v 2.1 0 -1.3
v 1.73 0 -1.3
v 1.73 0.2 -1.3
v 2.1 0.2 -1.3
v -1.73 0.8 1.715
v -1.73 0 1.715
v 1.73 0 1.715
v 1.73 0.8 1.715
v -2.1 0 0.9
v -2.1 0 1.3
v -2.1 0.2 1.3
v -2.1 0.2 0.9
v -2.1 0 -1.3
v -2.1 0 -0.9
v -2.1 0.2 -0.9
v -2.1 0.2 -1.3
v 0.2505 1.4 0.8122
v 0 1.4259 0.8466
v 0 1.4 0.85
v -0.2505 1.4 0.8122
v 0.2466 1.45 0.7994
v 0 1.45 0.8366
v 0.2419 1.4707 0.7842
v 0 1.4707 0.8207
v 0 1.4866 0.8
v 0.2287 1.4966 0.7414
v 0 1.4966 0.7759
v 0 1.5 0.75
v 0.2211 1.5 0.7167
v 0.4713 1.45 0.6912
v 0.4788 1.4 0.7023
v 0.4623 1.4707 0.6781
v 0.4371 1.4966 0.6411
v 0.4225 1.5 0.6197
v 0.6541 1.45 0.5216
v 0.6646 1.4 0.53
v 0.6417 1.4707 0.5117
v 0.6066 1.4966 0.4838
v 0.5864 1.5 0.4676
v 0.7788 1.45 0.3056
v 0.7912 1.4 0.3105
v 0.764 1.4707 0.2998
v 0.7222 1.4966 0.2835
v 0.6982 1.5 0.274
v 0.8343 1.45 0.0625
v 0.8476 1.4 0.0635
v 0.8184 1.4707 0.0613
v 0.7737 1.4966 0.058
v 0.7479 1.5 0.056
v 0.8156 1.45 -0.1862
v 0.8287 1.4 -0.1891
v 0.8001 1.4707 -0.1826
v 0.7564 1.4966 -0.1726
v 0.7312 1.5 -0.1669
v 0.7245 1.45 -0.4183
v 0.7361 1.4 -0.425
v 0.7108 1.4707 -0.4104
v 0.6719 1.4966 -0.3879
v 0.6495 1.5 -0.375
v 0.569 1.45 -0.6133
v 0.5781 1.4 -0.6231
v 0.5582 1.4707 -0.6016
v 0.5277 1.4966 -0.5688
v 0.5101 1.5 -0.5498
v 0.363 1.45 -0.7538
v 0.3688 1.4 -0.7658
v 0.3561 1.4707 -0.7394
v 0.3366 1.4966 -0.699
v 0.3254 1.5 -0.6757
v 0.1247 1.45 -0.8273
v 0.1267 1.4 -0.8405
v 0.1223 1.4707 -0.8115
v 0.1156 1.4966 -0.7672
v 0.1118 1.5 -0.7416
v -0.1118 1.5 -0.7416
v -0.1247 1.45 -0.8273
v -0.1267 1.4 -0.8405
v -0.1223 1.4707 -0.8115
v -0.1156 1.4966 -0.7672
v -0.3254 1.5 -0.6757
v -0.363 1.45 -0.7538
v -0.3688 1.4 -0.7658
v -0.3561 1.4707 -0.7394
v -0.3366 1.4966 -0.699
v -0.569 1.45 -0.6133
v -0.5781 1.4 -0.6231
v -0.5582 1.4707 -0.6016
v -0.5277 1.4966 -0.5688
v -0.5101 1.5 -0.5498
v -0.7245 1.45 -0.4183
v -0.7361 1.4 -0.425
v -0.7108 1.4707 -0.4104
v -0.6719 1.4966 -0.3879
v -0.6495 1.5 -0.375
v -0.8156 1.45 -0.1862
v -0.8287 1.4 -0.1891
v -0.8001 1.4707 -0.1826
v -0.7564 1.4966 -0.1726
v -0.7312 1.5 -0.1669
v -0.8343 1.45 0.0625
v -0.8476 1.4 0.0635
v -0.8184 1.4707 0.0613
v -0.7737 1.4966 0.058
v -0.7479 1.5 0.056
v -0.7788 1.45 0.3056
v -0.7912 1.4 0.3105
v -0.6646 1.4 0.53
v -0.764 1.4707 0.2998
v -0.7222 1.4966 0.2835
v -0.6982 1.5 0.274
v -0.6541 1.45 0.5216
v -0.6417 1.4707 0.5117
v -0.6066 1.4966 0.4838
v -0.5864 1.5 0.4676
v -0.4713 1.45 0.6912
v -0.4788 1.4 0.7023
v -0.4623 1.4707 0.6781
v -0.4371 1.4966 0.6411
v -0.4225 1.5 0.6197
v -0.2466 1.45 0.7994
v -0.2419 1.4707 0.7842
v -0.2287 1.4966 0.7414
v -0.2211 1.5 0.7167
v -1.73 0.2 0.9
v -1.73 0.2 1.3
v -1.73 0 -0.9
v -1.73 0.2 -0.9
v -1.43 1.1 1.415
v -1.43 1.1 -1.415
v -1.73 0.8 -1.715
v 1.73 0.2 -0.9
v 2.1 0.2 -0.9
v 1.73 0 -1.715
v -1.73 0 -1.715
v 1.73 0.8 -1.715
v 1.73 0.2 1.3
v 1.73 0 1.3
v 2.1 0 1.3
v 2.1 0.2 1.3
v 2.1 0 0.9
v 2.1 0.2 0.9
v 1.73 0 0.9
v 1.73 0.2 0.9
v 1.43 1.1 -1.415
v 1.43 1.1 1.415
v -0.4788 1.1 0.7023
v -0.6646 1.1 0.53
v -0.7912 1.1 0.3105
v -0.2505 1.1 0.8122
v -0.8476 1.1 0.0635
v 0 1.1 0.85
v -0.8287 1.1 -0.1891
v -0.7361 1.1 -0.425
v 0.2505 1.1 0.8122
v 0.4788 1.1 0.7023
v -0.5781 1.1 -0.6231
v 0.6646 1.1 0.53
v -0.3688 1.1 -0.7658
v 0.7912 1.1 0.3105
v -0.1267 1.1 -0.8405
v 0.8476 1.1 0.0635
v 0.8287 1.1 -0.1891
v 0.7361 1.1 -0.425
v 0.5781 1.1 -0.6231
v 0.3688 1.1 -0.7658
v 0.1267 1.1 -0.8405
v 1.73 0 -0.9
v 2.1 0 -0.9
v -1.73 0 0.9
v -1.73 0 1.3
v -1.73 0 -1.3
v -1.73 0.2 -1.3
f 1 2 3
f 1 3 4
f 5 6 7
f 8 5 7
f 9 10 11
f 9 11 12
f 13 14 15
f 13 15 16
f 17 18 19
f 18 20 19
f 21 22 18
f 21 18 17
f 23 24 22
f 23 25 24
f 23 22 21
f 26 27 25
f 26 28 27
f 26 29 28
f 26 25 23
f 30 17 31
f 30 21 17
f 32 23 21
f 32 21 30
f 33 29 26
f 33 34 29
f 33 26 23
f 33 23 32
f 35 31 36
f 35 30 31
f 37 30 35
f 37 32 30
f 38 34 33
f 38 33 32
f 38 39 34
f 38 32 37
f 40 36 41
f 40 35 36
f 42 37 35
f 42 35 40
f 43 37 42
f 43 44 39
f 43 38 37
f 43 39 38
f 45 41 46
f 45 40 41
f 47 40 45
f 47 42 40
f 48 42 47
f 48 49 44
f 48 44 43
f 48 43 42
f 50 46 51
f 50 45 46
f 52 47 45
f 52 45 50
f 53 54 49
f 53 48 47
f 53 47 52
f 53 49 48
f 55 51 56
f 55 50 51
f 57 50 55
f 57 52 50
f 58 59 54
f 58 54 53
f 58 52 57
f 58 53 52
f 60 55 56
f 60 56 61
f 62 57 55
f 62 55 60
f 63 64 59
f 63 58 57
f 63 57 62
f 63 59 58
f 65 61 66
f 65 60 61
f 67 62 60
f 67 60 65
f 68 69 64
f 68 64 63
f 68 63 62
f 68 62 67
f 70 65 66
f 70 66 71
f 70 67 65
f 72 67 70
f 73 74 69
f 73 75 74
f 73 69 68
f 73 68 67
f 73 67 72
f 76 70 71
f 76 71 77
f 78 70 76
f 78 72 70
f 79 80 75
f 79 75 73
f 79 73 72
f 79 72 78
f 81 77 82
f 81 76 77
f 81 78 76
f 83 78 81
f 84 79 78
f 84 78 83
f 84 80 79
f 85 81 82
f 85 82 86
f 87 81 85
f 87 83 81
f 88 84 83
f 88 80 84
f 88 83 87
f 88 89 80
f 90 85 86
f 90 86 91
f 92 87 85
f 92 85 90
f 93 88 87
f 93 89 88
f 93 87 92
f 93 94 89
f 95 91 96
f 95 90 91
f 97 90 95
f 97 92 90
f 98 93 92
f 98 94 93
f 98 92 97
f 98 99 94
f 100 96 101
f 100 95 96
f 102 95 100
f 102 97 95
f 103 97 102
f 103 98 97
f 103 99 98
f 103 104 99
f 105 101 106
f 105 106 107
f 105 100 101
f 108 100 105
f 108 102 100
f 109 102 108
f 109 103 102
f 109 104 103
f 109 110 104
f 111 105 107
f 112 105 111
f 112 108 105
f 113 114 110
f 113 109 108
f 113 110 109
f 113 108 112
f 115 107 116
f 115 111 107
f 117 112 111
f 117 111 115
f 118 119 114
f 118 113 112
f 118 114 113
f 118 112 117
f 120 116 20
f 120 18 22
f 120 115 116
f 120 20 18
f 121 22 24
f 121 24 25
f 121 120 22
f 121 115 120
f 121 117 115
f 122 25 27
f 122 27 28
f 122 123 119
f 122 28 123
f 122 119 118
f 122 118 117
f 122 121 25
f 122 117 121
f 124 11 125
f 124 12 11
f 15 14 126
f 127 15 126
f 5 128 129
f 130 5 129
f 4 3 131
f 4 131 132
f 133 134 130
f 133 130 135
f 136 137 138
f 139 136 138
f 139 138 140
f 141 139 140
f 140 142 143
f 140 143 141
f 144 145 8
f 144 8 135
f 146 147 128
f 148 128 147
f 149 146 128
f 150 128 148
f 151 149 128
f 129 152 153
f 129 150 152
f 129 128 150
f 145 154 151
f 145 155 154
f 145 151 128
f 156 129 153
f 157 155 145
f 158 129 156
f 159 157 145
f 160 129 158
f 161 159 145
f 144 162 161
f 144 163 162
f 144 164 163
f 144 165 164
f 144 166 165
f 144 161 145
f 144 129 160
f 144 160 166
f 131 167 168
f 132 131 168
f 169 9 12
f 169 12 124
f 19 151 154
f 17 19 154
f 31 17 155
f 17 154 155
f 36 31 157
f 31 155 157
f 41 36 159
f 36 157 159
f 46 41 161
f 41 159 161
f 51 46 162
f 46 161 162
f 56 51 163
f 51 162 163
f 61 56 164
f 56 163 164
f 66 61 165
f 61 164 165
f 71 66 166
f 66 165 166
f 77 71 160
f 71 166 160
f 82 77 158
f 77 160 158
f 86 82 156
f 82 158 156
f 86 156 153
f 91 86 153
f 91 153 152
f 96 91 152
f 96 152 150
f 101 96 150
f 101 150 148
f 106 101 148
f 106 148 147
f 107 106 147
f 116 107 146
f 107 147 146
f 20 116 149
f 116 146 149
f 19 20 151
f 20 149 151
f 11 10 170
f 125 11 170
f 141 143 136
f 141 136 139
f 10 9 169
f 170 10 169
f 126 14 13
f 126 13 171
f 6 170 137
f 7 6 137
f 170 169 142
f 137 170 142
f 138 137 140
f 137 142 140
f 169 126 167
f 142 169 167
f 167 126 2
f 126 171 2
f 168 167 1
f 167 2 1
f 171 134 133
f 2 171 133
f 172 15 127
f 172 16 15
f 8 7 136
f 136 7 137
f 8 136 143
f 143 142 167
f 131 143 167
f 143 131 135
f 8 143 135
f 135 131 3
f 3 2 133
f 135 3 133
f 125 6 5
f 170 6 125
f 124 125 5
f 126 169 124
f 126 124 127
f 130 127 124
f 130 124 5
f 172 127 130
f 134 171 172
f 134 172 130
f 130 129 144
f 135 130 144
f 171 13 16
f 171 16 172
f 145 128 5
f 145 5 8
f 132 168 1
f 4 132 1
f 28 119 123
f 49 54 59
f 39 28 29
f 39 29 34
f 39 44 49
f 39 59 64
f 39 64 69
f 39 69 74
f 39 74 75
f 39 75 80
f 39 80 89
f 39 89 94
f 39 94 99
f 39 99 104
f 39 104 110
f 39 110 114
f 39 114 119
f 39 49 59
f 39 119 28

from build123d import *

# Parameters (mm, degrees)
SKETCH1_W           = 3.46
SKETCH1_H           = 3.43
SKETCH1_W_2         = 0.37
SKETCH1_H_2         = 0.4
BOSS_EXTRUDE1_DEPTH = 0.2
SKETCH2_W           = 3.46
SKETCH2_H           = 3.43
BOSS_EXTRUDE2_DEPTH = 0.9
CHAMFER1_SIZE       = 0.3
SKETCH3_R           = 0.85
BOSS_EXTRUDE3_DEPTH = 0.4
FILLET1_R           = 0.1


with BuildPart() as part:
    # Sketch1 → Boss-Extrude1 (new body)
    with BuildSketch(Plane(origin=(0, 0, 0), x_dir=(1, 0, 0), z_dir=(0, 1, 0))):
        Rectangle(SKETCH1_W, SKETCH1_H)
        with Locations((1.915, -1.1)):
            Rectangle(SKETCH1_W_2, SKETCH1_H_2)
        with Locations((-1.915, -1.1)):
            Rectangle(SKETCH1_W_2, SKETCH1_H_2)
        with Locations((-1.915, 1.1)):
            Rectangle(SKETCH1_W_2, SKETCH1_H_2)
        with Locations((1.915, 1.1)):
            Rectangle(SKETCH1_W_2, SKETCH1_H_2)
    extrude(amount=BOSS_EXTRUDE1_DEPTH)

    # Sketch2 → Boss-Extrude2 (add)
    with BuildSketch(Plane(origin=(0, 0.2, 0), x_dir=(1, 0, 0), z_dir=(0, 1, 0))):
        Rectangle(SKETCH2_W, SKETCH2_H)
    extrude(amount=BOSS_EXTRUDE2_DEPTH)

    # Chamfer1
    chamfer1_edges = [part.edges().sort_by_distance(p)[0] for p in [
        (-1.73, 1.1, 0),
        (0, 1.1, 1.715),
        (1.73, 1.1, 0),
        (0, 1.1, -1.715),
    ]]
    chamfer(chamfer1_edges, length=CHAMFER1_SIZE)

    # Sketch3 → Boss-Extrude3 (add)
    with BuildSketch(Plane(origin=(0, 1.1, 0), x_dir=(1, 0, 0), z_dir=(0, 1, 0))):
        with Locations(Location((0, 0, 0), (0, 0, 270))):
            Circle(SKETCH3_R)
    extrude(amount=BOSS_EXTRUDE3_DEPTH)

    # Fillet1
    fillet1_edges = [part.edges().sort_by_distance(p)[0] for p in [
        (0, 1.5, -0.85),
    ]]
    fillet(fillet1_edges, radius=FILLET1_R)


solid = part.part
